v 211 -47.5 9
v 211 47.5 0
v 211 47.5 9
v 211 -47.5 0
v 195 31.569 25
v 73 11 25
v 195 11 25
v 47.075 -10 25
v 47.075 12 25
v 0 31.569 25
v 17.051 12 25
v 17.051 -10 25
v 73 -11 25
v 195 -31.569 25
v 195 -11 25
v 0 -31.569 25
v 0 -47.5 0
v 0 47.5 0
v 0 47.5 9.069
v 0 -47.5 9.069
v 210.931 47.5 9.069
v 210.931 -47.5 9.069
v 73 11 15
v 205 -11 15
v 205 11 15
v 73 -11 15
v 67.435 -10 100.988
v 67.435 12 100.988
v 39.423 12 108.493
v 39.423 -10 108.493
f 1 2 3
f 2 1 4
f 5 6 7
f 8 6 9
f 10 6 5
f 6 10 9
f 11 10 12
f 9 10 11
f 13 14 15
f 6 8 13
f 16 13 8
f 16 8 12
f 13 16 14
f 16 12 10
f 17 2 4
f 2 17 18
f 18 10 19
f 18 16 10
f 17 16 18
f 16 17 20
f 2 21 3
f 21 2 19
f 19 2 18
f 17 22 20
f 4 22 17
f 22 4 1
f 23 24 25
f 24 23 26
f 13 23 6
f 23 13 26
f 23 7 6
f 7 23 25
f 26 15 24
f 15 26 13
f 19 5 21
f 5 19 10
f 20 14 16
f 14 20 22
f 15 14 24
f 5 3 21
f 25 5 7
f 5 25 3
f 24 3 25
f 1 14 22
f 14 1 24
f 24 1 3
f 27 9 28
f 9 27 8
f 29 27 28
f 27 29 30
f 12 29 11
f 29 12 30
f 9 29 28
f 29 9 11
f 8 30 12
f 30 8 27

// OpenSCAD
base_length = 211;
pillar_length = 29;
pillar_width = 22;
pillar_height = 100;
slot_length = 140;
slot_width = 22;

module plate () {difference () {
        translate ([0, -47.5, 0]){cube ([base_length, 95, 25]);}
        translate ([73, -11, 15])cube ([slot_length, slot_width, 11]);
        rotate(a=45, v=[1, 0, 0])translate ([-2, 40, -30])cube ([215, 40, 40]);
rotate(a=45, v=[1, 0, 0])translate ([-2, -40, 40])cube ([215, 40, 40]);
translate ([170, -50, 50])rotate(a=45, v=[0, 1, 0])cube ([100,100,50]);
}}
module base() {union(){plate();rotate(a=15, v=[0, 1, 0])translate ([10, -10, 15])cube ([pillar_length, pillar_width, pillar_height]);}}
base();
